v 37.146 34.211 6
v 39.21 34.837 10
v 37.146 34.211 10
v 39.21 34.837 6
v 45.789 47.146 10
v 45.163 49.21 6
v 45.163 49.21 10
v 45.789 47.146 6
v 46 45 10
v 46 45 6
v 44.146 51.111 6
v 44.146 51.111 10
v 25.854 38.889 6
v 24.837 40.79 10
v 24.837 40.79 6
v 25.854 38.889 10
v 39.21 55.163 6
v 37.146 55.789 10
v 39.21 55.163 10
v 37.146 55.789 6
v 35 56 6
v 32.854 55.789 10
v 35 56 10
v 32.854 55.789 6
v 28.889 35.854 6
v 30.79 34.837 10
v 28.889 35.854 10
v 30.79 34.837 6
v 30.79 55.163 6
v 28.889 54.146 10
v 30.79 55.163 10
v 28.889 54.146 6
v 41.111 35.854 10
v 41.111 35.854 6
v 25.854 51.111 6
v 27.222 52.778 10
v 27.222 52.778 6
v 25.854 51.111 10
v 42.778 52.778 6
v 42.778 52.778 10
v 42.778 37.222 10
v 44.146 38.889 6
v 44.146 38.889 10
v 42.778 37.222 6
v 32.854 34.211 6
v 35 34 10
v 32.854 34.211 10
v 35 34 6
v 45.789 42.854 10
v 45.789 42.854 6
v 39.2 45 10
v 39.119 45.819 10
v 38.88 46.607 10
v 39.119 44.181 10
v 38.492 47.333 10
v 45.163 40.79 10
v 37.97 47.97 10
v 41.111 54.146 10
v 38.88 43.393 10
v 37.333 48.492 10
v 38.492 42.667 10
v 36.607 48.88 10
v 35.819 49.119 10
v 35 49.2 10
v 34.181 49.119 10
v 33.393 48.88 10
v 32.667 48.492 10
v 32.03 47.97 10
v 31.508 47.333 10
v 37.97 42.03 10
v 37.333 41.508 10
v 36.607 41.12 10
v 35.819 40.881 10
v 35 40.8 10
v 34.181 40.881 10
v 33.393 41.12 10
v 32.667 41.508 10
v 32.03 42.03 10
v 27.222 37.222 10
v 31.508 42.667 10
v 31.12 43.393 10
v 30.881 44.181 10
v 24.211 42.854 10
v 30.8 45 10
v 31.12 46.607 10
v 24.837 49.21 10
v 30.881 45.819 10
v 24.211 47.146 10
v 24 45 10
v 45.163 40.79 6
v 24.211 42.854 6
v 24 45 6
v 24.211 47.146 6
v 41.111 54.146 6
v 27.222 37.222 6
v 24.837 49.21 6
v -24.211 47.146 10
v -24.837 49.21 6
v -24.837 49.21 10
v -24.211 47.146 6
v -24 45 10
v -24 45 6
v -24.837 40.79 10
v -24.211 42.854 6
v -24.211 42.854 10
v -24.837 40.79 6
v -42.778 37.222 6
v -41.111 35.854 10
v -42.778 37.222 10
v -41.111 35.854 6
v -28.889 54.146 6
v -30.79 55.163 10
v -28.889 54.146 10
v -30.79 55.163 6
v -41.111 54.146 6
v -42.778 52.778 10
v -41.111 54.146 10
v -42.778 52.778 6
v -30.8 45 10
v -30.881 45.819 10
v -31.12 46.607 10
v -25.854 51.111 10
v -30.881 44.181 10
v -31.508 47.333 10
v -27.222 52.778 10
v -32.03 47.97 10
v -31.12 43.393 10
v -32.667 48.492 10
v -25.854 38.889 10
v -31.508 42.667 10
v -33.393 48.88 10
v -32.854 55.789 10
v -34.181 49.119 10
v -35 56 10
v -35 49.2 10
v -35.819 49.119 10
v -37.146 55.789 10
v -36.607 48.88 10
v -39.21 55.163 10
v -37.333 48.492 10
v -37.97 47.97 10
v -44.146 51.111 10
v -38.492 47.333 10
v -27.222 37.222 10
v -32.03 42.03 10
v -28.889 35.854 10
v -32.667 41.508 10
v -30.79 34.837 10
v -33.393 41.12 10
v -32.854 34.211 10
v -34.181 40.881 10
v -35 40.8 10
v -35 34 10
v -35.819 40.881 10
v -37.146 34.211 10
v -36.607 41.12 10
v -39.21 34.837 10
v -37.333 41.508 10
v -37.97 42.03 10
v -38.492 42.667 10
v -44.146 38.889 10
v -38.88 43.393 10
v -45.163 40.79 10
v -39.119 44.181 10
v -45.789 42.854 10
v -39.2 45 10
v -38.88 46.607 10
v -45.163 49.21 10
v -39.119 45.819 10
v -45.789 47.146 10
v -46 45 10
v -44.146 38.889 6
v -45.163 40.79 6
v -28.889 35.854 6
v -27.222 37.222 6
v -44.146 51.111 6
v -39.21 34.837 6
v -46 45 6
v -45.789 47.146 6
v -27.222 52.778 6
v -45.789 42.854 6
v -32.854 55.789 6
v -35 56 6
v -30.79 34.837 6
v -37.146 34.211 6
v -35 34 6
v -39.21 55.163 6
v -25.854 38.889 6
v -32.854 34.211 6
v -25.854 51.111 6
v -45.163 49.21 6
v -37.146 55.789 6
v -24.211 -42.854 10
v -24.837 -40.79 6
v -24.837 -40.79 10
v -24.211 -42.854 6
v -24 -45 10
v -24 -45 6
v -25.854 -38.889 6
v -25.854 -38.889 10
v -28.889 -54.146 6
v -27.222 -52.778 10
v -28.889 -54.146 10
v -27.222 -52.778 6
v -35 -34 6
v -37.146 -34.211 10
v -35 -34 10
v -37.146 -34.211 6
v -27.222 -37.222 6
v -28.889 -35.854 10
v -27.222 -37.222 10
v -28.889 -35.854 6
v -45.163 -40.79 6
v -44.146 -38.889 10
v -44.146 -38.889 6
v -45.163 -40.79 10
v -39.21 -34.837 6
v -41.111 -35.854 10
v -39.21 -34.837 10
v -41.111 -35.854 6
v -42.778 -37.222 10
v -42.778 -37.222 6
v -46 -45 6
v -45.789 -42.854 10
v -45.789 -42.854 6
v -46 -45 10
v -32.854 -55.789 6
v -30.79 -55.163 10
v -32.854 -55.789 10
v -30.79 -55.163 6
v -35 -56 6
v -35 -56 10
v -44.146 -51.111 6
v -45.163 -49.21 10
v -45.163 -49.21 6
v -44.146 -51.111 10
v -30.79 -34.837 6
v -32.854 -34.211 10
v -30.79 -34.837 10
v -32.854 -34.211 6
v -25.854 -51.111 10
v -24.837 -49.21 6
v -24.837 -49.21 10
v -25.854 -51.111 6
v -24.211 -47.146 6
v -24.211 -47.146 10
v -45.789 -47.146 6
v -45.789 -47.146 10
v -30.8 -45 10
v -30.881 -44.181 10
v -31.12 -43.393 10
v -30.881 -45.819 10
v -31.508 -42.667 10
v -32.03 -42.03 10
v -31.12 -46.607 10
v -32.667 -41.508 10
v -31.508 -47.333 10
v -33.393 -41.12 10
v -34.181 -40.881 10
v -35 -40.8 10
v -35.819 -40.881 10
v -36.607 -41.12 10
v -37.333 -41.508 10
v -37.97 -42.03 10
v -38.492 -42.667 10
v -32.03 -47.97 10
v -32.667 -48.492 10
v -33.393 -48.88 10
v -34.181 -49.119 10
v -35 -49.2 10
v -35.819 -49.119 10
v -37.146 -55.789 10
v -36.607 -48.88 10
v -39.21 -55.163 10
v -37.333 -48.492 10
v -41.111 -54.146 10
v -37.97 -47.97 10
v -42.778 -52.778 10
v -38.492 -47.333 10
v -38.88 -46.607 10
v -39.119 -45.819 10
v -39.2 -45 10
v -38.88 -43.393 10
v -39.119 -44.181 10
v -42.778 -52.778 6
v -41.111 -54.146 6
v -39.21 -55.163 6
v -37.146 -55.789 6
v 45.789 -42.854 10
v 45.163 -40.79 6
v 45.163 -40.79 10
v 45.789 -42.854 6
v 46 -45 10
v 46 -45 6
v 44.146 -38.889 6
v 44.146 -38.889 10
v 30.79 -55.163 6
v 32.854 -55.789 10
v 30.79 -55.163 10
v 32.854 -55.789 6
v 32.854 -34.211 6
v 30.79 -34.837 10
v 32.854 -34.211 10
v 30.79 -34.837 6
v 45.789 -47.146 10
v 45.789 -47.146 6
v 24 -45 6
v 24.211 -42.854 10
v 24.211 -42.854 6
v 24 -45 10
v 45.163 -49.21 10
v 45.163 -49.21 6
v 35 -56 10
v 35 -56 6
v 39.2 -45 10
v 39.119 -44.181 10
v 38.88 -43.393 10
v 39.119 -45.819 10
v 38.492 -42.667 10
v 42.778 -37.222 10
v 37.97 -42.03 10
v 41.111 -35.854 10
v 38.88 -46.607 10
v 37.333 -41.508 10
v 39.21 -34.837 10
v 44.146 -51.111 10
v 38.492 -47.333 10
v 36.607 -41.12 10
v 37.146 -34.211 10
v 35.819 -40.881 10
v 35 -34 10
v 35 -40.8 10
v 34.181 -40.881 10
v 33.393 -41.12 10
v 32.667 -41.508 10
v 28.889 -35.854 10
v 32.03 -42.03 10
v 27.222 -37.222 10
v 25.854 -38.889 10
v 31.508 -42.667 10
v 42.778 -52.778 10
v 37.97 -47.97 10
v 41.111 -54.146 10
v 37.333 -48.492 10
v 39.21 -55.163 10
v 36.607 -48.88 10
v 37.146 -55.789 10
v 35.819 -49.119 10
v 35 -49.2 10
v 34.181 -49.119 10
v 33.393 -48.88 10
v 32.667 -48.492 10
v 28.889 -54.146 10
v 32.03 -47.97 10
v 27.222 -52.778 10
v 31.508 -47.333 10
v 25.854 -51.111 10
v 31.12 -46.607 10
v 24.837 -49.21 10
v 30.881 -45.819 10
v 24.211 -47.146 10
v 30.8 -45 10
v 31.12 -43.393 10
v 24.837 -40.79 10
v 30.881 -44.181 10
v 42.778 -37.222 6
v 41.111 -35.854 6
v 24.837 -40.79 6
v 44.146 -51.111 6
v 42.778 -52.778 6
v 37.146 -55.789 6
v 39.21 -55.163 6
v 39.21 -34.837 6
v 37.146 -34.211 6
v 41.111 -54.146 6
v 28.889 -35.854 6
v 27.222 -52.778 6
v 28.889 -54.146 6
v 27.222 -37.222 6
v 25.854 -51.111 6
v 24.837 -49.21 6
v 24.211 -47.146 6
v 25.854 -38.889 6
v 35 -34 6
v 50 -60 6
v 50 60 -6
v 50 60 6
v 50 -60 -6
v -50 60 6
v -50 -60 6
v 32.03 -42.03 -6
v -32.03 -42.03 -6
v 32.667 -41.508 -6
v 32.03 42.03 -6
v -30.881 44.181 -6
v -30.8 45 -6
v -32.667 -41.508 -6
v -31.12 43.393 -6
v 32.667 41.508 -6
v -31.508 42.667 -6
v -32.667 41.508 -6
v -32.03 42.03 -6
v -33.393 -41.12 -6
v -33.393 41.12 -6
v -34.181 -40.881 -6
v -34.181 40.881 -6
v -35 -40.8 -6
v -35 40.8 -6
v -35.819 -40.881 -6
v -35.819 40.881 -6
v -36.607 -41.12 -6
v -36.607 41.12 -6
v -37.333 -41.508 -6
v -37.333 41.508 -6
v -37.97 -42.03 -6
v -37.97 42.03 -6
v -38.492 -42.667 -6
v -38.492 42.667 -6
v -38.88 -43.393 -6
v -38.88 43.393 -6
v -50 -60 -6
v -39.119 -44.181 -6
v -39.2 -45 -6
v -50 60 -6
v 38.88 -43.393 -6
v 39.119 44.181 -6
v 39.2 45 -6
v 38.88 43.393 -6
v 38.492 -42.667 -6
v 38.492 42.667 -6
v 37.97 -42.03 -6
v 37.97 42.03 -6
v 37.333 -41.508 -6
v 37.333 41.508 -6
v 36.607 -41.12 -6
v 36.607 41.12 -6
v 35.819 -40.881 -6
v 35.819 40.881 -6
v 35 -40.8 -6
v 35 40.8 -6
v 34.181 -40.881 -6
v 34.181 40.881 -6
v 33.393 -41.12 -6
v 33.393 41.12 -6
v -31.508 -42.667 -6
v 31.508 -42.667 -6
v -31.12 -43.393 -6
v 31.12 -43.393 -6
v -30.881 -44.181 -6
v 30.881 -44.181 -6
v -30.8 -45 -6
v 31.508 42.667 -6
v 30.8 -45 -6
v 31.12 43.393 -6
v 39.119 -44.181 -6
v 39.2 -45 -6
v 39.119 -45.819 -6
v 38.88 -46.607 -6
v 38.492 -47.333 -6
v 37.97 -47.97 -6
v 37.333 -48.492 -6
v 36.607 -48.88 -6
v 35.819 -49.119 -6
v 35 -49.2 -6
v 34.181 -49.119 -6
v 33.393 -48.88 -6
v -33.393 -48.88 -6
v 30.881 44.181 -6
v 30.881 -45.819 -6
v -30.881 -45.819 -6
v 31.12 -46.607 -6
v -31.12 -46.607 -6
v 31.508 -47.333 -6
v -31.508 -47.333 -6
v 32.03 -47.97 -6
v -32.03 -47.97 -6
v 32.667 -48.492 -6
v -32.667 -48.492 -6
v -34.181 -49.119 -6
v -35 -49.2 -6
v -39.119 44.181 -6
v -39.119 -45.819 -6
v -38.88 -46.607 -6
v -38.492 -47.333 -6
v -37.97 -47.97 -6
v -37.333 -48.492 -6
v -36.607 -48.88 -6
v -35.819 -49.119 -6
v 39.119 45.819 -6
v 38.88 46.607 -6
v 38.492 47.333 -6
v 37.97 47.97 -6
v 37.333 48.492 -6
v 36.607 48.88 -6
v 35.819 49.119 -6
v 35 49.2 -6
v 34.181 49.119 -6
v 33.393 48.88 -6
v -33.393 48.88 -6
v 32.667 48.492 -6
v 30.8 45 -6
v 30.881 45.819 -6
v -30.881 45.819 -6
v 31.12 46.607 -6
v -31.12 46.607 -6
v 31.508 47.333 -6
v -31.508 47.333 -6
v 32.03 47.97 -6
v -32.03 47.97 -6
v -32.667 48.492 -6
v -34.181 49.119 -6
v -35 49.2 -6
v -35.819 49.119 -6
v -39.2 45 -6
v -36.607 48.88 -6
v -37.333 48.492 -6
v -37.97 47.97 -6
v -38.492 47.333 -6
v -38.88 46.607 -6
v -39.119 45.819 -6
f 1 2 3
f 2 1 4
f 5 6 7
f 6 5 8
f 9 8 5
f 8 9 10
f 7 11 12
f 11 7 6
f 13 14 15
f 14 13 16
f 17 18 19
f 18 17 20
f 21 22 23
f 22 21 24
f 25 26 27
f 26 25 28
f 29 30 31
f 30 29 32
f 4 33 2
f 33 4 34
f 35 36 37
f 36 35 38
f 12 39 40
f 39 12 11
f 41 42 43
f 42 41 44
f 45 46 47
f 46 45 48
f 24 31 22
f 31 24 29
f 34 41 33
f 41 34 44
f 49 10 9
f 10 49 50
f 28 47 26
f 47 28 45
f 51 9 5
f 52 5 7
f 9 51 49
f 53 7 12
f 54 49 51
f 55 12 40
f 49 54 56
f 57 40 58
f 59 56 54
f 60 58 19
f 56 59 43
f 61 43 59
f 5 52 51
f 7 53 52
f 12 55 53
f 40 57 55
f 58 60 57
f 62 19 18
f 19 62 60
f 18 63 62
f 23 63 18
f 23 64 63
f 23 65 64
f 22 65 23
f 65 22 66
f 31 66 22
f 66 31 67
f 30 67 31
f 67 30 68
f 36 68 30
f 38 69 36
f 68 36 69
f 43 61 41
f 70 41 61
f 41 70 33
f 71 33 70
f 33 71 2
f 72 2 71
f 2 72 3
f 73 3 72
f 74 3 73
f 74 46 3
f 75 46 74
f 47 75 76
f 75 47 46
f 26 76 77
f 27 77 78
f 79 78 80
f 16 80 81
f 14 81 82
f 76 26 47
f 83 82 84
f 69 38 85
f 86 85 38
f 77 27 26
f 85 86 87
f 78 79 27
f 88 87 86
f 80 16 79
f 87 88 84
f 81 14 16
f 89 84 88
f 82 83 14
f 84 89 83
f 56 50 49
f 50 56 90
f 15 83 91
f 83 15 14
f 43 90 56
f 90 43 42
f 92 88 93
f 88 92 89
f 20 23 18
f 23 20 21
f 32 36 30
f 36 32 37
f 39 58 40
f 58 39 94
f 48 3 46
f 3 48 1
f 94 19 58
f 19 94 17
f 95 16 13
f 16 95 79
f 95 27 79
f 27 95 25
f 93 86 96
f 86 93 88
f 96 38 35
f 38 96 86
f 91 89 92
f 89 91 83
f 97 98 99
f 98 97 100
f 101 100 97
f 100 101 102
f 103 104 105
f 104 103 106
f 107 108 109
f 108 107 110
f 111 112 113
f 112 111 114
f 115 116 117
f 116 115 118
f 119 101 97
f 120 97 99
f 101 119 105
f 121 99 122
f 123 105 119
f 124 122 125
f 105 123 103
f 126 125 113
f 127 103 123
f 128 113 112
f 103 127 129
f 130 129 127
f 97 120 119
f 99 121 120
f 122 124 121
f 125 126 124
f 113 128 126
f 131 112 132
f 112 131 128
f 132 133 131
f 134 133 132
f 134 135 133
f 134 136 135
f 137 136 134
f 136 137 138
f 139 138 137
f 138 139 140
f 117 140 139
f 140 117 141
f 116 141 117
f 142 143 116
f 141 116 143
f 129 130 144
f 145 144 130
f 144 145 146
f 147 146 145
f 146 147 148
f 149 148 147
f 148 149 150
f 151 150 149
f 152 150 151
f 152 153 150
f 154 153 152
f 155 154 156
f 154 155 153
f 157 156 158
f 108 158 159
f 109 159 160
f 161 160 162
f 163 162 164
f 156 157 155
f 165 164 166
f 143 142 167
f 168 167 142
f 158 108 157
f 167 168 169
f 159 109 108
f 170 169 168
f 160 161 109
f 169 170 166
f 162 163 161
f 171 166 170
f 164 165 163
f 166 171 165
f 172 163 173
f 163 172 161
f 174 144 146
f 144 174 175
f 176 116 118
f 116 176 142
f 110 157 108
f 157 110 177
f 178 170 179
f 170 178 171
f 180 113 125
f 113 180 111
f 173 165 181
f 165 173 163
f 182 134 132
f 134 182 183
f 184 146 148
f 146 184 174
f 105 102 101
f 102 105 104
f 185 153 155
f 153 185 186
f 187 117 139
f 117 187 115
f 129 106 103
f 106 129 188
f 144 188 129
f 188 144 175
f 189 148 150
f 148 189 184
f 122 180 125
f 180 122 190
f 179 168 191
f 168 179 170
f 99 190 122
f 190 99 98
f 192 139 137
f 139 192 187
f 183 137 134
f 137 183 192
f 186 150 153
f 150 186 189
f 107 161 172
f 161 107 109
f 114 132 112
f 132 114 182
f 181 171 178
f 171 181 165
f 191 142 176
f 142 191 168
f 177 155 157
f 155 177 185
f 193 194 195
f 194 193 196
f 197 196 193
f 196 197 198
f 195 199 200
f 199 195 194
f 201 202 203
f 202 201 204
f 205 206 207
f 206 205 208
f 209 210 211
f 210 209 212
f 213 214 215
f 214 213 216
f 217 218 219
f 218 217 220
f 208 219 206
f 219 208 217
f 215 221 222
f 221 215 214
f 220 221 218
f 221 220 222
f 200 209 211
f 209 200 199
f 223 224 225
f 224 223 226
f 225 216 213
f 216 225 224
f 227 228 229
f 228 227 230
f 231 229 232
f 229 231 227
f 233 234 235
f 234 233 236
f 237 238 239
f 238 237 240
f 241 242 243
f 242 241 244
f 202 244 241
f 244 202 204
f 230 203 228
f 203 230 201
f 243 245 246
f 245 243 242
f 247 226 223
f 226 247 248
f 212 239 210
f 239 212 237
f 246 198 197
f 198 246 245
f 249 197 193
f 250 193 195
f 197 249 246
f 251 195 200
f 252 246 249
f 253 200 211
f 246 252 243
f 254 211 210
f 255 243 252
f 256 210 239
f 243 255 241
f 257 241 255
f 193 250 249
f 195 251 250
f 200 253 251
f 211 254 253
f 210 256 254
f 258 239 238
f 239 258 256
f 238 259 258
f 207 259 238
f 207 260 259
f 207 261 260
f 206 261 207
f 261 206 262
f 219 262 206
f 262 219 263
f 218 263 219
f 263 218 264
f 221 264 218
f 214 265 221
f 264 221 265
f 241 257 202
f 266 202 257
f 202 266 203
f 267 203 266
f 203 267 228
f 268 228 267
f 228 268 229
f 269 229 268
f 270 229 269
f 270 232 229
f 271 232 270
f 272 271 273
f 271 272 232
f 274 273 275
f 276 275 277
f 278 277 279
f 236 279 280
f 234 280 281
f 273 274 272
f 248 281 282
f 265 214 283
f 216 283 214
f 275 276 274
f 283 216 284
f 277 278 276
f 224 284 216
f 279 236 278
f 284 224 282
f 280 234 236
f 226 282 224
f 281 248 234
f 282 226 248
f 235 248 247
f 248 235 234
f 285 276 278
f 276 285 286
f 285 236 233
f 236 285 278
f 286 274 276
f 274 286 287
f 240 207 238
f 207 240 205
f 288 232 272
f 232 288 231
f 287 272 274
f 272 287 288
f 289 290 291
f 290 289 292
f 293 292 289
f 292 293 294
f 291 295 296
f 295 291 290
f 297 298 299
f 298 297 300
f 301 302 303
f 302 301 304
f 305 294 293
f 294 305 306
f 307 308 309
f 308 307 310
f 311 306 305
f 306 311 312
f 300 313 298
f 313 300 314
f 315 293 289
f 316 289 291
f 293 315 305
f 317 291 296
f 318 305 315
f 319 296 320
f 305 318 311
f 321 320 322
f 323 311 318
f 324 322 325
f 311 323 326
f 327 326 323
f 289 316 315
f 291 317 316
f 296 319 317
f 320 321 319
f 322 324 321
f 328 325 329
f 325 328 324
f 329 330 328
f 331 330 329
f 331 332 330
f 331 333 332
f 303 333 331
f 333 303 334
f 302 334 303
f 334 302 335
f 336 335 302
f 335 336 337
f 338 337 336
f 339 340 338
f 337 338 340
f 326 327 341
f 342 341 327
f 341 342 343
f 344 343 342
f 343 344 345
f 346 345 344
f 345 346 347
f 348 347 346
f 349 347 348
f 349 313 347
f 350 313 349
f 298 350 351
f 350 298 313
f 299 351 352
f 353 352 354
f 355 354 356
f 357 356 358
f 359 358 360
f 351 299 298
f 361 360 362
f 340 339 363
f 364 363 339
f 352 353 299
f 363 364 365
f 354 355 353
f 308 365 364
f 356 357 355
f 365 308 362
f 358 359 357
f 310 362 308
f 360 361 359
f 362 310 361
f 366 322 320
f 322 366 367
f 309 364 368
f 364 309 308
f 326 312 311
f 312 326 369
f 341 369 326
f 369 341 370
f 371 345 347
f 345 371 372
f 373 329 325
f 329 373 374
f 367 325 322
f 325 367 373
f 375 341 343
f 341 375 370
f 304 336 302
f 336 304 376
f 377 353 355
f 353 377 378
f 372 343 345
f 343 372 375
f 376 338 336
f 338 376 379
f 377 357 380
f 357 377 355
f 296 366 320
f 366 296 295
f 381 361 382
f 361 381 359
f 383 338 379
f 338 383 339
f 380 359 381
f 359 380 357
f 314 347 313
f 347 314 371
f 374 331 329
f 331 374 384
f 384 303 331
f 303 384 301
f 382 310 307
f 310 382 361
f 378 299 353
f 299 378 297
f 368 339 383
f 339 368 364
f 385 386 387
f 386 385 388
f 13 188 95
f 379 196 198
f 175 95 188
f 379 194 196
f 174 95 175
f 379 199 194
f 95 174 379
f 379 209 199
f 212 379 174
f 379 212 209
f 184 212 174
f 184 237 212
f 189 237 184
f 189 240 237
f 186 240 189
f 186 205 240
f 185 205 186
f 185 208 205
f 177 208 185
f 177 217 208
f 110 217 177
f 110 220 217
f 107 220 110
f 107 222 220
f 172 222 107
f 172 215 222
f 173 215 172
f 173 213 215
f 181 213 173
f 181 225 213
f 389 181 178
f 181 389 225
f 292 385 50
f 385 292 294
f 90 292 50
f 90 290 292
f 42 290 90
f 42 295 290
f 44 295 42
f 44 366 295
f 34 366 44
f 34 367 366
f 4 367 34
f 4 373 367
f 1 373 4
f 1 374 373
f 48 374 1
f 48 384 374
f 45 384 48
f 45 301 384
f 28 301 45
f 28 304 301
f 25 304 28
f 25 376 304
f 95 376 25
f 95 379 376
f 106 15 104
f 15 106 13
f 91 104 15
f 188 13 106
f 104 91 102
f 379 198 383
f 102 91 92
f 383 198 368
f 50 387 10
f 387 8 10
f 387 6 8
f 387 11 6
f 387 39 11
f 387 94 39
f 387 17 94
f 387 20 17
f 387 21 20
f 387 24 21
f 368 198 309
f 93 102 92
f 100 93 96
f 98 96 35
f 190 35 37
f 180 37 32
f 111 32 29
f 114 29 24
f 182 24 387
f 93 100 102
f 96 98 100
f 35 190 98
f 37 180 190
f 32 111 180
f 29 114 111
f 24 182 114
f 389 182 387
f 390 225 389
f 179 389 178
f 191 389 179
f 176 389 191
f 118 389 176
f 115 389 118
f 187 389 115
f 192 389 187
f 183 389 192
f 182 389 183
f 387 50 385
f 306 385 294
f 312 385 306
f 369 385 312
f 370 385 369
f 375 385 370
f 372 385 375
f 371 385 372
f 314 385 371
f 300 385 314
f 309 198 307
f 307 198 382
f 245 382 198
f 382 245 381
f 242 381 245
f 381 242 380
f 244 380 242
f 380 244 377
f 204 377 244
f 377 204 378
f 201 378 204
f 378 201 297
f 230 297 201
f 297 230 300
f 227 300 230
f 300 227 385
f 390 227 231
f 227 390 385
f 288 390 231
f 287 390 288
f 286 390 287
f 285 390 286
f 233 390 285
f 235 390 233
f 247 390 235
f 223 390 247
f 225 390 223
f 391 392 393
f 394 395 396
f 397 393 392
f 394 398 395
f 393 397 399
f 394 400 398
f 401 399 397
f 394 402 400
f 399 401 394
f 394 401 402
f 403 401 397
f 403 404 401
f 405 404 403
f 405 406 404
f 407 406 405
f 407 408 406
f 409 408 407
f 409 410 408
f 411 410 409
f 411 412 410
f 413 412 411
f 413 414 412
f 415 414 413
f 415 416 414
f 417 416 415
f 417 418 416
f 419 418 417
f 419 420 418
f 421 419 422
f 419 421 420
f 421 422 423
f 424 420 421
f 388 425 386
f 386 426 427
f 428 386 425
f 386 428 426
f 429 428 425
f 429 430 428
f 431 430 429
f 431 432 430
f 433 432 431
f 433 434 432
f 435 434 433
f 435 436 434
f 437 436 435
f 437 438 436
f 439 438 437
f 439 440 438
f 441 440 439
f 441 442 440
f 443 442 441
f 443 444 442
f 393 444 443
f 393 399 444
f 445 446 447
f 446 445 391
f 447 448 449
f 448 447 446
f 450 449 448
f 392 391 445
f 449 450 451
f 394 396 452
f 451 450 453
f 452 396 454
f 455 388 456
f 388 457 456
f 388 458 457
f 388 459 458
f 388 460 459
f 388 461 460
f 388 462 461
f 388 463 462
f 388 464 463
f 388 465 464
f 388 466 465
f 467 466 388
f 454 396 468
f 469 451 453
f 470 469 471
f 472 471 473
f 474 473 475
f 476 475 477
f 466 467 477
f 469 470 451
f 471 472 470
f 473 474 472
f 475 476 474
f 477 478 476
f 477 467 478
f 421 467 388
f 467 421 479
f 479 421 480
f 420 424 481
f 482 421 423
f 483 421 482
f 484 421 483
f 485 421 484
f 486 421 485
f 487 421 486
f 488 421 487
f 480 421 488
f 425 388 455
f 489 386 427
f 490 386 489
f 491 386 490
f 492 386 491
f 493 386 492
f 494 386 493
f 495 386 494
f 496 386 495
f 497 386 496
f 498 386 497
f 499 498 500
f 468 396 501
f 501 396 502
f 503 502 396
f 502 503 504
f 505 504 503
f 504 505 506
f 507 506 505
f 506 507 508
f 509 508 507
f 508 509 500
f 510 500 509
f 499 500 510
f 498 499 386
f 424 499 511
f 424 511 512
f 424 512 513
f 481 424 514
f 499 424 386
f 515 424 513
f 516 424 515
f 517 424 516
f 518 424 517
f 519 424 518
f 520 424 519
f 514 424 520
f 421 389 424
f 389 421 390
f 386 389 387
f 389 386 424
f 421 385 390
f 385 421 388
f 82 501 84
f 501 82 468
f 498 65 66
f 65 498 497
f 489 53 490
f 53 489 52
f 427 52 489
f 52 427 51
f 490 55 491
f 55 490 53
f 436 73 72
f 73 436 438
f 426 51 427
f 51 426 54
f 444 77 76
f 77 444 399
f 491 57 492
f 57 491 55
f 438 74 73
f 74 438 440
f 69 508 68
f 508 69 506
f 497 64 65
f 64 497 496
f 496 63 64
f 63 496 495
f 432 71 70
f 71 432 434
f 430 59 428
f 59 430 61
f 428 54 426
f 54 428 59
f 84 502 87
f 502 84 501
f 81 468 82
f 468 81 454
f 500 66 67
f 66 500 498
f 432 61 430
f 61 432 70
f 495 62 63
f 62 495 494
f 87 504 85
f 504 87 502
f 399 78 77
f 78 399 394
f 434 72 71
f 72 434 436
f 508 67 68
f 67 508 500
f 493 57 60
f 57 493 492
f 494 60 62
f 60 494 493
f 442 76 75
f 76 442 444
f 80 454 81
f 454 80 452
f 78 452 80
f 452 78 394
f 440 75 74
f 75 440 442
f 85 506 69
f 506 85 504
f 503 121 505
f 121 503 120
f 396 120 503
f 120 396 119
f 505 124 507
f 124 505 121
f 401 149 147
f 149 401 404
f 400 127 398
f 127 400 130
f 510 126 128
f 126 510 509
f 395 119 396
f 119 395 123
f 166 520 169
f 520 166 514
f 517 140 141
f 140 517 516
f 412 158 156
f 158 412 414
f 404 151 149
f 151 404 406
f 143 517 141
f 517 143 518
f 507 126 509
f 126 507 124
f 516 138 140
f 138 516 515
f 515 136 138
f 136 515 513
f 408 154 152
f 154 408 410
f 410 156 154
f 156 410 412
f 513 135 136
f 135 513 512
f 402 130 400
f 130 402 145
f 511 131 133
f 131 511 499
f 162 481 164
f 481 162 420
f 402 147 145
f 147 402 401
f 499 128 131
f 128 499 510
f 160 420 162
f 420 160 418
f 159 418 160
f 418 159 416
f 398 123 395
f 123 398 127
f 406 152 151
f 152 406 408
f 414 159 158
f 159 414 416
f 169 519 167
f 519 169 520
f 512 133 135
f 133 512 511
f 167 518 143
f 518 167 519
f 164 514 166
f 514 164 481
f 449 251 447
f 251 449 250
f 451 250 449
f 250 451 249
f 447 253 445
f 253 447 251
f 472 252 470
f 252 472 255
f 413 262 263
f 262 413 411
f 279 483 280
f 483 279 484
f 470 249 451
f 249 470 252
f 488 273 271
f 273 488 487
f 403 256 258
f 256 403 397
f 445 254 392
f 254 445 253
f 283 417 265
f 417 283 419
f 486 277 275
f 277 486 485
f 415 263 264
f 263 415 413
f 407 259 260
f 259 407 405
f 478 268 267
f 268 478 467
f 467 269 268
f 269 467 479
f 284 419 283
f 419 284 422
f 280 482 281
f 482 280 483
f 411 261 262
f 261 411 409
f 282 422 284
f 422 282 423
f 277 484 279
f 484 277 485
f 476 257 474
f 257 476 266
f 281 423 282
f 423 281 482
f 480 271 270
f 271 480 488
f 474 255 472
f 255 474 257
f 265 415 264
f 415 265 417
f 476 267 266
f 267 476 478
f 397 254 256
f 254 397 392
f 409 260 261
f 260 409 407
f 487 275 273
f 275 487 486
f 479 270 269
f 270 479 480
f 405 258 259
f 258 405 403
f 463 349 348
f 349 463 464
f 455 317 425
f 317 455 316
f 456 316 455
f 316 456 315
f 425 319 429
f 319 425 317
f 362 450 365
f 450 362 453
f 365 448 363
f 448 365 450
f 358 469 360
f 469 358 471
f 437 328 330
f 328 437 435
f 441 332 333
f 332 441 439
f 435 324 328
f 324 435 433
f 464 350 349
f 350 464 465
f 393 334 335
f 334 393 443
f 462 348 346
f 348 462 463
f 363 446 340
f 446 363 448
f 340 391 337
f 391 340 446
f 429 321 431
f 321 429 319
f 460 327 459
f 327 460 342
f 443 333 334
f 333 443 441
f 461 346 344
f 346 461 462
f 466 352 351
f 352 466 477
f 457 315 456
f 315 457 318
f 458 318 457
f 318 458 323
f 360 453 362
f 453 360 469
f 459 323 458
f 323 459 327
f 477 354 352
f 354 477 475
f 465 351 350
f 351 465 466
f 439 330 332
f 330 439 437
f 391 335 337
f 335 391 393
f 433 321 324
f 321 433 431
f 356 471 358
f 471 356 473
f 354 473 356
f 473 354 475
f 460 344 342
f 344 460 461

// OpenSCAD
$fn = 32;

// ----------------------------------------------------------------------
// Anchor pads 100 x 120 x 16
// four corner bosses with anchor holes
// ----------------------------------------------------------------------

// --- parameters (mm) ---
plate = [100, 120, 12];  // base plate size (x, y, z)
pads = 4;                // boss count, one per corner
edge = 15;               // boss centre offset from the plate edge
boss_d = 22;             // boss diameter
boss_h = 4;              // boss height above the base plate
hole_d = 8.4;            // hole diameter

// --- derived feature positions (mm) ---
height = plate[2] + boss_h;      // = 16   overall height of the part
corner_x = plate[0] / 2 - edge;  // = 35   boss centre X
corner_y = plate[1] / 2 - edge;  // = 45   boss centre Y
feature_centers = [
  [corner_x, corner_y],
  [-corner_x, corner_y],
  [-corner_x, -corner_y],
  [corner_x, -corner_y]
];   // boss centres, anchor holes are drilled there

// base plate, four bosses standing on it, anchor holes all the way through
difference() {
  union() {
    cube(plate, center = true);
    for (centre = feature_centers)
      translate([centre[0], centre[1], plate[2] / 2 - 1])
        cylinder(d = boss_d, h = boss_h + 1);
  }
  for (centre = feature_centers)
    translate([centre[0], centre[1], -height])
      cylinder(d = hole_d, h = 2 * height + 2);  // through boss and plate
}
